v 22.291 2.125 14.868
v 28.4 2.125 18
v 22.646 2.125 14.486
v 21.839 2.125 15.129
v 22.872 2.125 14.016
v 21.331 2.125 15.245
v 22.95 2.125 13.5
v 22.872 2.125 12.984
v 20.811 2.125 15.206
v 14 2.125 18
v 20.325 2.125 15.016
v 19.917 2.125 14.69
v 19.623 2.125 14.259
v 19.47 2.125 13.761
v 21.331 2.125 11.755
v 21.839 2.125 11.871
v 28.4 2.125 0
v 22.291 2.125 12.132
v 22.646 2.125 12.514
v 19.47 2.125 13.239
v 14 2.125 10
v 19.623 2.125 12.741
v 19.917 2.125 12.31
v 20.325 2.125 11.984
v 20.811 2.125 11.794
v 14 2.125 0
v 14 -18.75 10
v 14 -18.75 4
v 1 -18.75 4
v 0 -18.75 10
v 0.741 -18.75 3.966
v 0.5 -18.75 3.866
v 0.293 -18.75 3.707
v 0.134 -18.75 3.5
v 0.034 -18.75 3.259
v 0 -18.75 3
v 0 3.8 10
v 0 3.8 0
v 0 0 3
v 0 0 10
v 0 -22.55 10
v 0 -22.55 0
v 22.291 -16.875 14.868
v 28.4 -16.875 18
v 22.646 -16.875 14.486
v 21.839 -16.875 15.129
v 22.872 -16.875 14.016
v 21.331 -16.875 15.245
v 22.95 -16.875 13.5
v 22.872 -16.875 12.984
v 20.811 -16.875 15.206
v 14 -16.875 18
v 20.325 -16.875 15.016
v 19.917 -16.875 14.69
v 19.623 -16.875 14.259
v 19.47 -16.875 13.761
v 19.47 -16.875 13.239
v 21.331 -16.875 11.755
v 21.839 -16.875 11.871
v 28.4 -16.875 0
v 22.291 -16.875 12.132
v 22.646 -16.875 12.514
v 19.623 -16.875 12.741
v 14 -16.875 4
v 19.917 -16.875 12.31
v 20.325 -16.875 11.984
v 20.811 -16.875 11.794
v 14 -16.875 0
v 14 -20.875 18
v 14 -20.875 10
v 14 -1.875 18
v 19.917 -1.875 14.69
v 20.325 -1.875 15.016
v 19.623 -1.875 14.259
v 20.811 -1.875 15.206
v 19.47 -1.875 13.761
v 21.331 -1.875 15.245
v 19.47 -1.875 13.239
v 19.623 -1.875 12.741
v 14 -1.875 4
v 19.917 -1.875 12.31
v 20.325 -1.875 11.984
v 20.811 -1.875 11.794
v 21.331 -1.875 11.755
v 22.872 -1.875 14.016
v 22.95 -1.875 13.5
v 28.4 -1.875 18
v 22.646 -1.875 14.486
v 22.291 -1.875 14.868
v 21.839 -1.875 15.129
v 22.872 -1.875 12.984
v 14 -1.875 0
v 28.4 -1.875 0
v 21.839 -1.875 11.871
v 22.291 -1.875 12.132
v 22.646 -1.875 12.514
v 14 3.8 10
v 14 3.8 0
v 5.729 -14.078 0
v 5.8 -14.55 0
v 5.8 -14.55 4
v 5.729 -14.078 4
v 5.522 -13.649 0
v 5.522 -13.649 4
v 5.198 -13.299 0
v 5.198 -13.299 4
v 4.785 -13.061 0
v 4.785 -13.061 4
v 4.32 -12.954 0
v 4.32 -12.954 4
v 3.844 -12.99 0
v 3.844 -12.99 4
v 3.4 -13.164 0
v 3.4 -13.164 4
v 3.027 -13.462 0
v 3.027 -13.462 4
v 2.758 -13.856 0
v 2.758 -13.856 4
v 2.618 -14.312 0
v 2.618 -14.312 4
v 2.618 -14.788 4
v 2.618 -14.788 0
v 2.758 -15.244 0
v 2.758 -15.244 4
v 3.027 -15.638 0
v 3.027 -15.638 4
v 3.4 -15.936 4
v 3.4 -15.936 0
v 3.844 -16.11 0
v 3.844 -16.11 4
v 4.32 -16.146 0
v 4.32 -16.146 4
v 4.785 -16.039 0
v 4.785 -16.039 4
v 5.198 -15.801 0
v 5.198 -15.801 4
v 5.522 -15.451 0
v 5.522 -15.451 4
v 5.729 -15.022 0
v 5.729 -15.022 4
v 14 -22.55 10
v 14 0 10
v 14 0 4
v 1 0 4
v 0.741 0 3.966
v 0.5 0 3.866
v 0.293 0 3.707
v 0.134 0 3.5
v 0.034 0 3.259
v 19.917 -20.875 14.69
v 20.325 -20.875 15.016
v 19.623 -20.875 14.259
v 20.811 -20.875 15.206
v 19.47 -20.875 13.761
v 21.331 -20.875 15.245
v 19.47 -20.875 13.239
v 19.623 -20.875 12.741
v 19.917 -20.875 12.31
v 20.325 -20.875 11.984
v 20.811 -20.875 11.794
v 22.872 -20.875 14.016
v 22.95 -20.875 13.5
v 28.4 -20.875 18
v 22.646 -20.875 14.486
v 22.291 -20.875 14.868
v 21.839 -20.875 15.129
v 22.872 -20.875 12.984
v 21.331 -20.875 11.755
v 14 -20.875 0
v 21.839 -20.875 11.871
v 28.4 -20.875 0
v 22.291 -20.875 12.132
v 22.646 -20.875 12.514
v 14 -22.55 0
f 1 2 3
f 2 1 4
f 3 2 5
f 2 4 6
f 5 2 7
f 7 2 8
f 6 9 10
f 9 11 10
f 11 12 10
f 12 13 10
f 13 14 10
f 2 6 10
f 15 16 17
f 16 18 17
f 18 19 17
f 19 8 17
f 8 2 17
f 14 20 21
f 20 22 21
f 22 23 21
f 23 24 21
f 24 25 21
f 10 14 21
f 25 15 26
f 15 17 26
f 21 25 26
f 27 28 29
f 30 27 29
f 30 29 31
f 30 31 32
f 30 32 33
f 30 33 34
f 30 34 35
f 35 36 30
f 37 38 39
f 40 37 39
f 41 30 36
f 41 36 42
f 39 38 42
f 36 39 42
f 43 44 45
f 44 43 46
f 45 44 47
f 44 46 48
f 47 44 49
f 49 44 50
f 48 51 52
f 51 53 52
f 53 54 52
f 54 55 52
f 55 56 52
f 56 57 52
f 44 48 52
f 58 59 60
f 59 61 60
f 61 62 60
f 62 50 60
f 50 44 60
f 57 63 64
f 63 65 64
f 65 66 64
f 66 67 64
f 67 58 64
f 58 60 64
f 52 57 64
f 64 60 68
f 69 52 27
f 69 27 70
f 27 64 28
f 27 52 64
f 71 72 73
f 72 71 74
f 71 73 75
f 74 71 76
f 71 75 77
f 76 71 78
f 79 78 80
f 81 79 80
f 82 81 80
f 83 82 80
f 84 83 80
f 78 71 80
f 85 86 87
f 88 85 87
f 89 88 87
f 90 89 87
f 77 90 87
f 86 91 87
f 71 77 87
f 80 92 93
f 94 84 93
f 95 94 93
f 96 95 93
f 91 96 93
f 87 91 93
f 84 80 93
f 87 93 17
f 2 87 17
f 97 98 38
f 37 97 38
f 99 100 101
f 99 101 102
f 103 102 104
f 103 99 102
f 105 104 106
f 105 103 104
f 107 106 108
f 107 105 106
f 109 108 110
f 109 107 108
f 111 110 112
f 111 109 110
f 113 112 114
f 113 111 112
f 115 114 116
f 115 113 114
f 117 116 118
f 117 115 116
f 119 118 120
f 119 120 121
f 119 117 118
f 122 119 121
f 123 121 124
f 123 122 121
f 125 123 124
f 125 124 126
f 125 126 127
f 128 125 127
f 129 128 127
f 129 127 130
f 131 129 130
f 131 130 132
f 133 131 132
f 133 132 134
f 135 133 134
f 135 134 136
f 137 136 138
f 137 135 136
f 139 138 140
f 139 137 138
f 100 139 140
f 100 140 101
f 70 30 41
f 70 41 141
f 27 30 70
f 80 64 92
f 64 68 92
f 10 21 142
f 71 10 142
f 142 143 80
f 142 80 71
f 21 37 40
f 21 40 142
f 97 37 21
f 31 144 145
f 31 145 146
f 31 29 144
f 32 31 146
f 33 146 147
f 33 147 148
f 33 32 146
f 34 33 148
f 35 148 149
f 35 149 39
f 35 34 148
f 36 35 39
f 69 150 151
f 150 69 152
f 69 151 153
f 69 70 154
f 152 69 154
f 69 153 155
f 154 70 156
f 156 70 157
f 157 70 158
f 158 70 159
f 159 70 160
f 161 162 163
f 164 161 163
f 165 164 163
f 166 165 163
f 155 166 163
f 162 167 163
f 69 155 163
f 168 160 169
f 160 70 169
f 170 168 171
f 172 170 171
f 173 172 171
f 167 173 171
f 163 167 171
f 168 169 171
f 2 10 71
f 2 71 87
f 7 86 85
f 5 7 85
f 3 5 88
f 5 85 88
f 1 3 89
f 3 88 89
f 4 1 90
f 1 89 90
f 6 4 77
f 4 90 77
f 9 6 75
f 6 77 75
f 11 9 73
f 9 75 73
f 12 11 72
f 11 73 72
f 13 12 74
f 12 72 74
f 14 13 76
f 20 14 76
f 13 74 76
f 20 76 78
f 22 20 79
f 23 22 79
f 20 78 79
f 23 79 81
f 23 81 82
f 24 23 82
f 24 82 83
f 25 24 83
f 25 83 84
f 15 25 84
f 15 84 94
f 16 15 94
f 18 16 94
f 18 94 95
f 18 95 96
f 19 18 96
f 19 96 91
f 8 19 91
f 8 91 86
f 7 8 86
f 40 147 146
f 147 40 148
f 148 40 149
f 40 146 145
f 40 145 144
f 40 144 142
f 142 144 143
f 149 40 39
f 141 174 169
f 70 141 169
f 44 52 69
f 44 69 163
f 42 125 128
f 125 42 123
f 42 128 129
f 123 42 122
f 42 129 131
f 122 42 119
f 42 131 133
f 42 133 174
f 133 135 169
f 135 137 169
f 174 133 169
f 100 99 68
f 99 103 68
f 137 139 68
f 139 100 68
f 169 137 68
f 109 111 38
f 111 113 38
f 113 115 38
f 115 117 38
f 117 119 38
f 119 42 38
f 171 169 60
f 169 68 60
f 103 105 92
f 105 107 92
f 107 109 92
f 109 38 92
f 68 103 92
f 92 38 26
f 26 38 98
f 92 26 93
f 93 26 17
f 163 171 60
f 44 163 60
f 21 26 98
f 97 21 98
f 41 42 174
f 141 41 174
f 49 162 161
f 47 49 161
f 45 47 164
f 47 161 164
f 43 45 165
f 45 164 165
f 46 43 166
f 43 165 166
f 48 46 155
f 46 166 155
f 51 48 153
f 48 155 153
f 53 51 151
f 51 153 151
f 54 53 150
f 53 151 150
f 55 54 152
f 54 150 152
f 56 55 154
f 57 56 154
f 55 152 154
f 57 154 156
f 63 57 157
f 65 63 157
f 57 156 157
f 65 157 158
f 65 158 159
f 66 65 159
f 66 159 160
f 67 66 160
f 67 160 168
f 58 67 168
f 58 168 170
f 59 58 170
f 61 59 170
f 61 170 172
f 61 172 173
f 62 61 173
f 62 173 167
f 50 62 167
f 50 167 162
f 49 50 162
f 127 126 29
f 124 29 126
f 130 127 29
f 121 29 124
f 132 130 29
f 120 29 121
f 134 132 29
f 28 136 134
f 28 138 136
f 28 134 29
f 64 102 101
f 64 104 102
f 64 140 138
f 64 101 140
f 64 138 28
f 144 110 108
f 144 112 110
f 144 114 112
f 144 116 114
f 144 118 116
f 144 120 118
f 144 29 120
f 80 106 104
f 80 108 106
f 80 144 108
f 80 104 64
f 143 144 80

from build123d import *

# Parameters (mm, degrees)
F0_R     = 1.6
F1_DEPTH = 4
F2_DEPTH = 10
F3_DEPTH = 18
F4_R     = 1.75
F5_DEPTH = 23
F6_R     = 1


with BuildPart() as f1:
    # F0 (on Top) → F1 (new body)
    with BuildSketch(Plane.XY):
        Polygon((14, 0), (0, 0), (0, -18.75), (14, -18.75), (14, -16.875), (14, -1.875), align=None)
        with Locations((4.2, -14.55)):
            Circle(F0_R, mode=Mode.SUBTRACT)
    extrude(amount=F1_DEPTH)

    # F0 (on Top) → F2 (join)
    with BuildSketch(Plane.XY):
        Polygon((0, 3.8), (0, 0), (14, 0), (14, 2.125), (14, 3.8), align=None)
        Polygon((14, -18.75), (0, -18.75), (0, -22.55), (14, -22.55), (14, -20.875), align=None)
    extrude(amount=F2_DEPTH)

    # F0 (on Top) → F3 (join)
    with BuildSketch(Plane.XY):
        Polygon((14, 2.125), (14, 0), (14, -1.875), (28.4, -1.875), (28.4, 2.125), align=None)
        Polygon((14, -16.875), (14, -18.75), (14, -20.875), (28.4, -20.875), (28.4, -16.875), align=None)
    extrude(amount=F3_DEPTH)

    # F4 (on face) → F5 (cut, through all)
    with BuildSketch(Plane.XZ.offset(20.875)):
        with Locations((21.2, 13.5)):
            Circle(F4_R)
    extrude(amount=-F5_DEPTH, mode=Mode.SUBTRACT)

    # F6
    f6_edges = [f1.edges().sort_by_distance(p)[0] for p in [
        (0, -9.375, 4),
    ]]
    fillet(f6_edges, radius=F6_R)


solid = f1.part
